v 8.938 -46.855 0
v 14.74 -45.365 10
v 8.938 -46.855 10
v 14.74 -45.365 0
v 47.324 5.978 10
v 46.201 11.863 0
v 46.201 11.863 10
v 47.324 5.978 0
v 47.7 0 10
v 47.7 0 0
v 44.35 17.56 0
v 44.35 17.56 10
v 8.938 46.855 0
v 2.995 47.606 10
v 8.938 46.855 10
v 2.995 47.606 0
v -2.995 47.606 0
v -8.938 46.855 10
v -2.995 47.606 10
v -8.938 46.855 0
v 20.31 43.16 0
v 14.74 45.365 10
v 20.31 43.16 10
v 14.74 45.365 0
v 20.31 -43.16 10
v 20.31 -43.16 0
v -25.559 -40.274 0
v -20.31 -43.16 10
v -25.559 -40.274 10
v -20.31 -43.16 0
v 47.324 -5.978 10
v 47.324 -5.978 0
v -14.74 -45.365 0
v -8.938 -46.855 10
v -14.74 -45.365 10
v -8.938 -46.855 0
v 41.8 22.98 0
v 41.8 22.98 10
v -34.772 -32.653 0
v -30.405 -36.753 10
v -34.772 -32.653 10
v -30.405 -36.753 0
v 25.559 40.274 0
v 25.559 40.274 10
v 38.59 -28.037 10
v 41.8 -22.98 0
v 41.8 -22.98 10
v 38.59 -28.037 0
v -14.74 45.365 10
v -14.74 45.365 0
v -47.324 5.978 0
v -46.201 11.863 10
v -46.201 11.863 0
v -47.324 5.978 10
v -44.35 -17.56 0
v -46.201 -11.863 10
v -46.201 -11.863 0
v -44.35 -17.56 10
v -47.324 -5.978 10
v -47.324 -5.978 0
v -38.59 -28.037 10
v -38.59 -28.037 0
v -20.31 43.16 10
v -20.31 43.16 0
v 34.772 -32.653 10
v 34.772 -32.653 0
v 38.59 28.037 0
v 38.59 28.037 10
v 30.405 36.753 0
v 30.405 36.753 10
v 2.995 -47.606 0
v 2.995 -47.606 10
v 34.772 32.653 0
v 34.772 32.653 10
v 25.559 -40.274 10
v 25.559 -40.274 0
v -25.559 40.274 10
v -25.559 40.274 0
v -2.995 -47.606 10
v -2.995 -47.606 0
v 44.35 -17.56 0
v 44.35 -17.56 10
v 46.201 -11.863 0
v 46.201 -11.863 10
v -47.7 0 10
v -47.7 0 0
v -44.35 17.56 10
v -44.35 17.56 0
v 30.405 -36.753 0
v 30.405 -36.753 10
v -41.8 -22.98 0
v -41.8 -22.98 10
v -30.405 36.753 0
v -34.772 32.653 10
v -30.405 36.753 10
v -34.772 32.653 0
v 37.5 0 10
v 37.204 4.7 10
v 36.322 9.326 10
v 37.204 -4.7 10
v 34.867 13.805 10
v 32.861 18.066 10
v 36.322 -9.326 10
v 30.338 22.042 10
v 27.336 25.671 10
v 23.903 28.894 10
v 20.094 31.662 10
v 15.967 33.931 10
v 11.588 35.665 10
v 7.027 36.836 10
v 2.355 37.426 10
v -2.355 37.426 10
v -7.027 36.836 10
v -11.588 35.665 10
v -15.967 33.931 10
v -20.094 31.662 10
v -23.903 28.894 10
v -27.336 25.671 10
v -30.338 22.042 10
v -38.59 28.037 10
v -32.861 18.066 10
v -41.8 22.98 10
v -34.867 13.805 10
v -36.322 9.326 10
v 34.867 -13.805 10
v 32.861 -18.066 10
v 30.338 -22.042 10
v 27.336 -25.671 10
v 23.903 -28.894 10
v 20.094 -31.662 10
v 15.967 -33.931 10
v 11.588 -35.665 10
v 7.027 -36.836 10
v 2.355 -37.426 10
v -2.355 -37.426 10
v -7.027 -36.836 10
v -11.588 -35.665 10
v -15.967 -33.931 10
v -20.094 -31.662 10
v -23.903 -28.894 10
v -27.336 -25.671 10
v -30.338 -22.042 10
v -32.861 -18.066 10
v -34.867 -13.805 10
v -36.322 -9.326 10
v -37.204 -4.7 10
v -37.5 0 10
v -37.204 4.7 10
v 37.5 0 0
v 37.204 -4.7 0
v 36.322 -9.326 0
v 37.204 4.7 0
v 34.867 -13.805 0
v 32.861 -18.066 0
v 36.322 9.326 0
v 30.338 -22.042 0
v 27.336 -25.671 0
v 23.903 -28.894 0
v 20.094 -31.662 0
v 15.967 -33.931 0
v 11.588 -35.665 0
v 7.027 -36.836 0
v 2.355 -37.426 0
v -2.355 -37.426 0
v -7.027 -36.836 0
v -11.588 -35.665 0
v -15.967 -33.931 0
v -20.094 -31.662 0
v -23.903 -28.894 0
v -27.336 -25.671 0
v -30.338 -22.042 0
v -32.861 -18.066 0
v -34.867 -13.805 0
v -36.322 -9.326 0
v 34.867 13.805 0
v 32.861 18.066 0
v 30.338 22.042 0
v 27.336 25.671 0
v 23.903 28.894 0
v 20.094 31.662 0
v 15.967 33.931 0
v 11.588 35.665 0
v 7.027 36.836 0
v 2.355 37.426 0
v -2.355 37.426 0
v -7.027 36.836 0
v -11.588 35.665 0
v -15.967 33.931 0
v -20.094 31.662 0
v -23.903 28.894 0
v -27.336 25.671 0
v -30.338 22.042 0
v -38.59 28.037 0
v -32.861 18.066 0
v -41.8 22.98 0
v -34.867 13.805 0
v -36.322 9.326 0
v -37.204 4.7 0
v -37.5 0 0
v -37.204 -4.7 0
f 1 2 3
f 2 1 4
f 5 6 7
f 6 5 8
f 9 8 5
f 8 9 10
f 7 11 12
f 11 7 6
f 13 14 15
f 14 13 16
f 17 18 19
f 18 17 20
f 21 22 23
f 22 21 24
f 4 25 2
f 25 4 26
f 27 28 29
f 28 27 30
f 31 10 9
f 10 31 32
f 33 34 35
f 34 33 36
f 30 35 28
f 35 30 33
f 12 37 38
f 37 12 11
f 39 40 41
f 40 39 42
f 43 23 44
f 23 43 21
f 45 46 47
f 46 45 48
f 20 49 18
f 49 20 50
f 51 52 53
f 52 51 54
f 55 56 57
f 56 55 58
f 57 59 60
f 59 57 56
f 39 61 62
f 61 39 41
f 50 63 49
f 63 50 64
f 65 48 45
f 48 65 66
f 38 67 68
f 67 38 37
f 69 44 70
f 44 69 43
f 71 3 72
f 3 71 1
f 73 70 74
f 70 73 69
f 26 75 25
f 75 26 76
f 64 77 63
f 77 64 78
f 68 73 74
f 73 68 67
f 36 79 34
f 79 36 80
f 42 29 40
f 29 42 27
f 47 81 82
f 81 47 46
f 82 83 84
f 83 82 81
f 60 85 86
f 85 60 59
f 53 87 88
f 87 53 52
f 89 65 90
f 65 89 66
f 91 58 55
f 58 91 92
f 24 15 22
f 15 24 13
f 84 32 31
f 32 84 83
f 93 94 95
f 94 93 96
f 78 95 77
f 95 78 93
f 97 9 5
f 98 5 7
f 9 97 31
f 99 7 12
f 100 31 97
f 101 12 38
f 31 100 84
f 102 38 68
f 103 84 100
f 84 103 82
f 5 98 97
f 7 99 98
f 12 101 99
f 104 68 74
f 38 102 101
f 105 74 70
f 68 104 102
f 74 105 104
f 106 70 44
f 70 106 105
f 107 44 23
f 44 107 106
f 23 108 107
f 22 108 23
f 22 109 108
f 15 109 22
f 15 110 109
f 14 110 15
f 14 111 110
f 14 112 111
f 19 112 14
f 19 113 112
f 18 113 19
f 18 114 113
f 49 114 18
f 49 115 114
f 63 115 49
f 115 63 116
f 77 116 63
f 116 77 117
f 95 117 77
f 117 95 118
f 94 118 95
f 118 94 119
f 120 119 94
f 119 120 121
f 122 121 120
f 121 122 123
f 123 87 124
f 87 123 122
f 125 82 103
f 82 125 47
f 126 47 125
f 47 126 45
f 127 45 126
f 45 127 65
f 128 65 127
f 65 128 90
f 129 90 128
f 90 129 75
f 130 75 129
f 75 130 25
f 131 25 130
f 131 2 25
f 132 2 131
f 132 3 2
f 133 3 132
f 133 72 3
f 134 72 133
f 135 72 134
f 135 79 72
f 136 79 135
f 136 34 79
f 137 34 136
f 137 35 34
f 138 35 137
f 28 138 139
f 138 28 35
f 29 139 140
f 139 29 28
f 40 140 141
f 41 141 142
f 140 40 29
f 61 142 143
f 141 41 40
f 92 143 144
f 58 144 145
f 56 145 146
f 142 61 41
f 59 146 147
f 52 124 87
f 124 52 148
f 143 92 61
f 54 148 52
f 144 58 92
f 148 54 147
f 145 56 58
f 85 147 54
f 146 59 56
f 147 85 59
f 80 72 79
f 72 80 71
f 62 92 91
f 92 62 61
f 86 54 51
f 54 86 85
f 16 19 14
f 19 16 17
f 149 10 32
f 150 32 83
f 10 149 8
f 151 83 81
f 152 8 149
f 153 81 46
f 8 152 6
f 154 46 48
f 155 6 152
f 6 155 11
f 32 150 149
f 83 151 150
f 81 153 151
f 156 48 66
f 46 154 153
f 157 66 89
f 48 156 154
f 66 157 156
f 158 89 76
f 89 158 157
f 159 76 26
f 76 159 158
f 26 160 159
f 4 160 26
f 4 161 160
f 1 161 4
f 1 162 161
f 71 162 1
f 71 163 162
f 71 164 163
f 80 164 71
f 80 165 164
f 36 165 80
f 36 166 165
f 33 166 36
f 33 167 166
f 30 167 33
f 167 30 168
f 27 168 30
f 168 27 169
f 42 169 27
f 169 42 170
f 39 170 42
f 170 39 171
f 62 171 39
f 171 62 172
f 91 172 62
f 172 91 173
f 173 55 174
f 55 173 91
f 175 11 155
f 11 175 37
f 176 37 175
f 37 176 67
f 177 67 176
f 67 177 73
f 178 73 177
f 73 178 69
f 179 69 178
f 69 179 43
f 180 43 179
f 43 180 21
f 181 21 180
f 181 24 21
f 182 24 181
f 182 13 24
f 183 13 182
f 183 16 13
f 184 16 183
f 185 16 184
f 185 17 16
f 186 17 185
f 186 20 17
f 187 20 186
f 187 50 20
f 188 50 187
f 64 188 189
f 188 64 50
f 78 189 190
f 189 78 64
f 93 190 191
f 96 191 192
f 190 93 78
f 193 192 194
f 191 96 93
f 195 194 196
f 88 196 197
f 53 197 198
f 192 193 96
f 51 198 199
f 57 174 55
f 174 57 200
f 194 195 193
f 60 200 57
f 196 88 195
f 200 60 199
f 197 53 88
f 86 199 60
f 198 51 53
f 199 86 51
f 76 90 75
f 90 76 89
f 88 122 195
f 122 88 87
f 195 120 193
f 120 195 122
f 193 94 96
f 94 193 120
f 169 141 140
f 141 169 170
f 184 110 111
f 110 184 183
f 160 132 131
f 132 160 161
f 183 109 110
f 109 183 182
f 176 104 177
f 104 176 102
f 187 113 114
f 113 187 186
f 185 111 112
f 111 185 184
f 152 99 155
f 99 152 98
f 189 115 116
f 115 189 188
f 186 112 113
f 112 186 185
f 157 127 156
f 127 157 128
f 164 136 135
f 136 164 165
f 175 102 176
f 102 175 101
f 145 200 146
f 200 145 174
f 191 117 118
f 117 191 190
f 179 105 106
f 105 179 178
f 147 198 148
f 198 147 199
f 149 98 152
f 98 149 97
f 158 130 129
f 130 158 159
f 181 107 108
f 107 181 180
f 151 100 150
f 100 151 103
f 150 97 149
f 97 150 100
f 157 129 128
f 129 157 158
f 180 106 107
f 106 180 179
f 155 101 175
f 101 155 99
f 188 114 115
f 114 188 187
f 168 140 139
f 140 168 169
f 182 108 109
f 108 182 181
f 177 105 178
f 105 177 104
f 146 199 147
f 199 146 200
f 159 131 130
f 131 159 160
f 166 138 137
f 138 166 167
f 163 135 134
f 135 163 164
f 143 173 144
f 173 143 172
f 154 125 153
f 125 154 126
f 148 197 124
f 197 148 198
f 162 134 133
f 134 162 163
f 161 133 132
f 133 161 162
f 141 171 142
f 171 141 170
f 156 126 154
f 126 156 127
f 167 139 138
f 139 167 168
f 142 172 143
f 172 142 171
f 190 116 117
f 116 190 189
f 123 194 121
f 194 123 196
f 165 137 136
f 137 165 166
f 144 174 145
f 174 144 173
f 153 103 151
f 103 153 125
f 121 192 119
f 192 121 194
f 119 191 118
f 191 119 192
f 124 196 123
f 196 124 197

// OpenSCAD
$fn = 50;


difference() {
	union() {
		cylinder(h = 10, r = 47.7000000000);
	}
	union() {
		cylinder(h = 10, r = 37.5000000000);
	}
}
